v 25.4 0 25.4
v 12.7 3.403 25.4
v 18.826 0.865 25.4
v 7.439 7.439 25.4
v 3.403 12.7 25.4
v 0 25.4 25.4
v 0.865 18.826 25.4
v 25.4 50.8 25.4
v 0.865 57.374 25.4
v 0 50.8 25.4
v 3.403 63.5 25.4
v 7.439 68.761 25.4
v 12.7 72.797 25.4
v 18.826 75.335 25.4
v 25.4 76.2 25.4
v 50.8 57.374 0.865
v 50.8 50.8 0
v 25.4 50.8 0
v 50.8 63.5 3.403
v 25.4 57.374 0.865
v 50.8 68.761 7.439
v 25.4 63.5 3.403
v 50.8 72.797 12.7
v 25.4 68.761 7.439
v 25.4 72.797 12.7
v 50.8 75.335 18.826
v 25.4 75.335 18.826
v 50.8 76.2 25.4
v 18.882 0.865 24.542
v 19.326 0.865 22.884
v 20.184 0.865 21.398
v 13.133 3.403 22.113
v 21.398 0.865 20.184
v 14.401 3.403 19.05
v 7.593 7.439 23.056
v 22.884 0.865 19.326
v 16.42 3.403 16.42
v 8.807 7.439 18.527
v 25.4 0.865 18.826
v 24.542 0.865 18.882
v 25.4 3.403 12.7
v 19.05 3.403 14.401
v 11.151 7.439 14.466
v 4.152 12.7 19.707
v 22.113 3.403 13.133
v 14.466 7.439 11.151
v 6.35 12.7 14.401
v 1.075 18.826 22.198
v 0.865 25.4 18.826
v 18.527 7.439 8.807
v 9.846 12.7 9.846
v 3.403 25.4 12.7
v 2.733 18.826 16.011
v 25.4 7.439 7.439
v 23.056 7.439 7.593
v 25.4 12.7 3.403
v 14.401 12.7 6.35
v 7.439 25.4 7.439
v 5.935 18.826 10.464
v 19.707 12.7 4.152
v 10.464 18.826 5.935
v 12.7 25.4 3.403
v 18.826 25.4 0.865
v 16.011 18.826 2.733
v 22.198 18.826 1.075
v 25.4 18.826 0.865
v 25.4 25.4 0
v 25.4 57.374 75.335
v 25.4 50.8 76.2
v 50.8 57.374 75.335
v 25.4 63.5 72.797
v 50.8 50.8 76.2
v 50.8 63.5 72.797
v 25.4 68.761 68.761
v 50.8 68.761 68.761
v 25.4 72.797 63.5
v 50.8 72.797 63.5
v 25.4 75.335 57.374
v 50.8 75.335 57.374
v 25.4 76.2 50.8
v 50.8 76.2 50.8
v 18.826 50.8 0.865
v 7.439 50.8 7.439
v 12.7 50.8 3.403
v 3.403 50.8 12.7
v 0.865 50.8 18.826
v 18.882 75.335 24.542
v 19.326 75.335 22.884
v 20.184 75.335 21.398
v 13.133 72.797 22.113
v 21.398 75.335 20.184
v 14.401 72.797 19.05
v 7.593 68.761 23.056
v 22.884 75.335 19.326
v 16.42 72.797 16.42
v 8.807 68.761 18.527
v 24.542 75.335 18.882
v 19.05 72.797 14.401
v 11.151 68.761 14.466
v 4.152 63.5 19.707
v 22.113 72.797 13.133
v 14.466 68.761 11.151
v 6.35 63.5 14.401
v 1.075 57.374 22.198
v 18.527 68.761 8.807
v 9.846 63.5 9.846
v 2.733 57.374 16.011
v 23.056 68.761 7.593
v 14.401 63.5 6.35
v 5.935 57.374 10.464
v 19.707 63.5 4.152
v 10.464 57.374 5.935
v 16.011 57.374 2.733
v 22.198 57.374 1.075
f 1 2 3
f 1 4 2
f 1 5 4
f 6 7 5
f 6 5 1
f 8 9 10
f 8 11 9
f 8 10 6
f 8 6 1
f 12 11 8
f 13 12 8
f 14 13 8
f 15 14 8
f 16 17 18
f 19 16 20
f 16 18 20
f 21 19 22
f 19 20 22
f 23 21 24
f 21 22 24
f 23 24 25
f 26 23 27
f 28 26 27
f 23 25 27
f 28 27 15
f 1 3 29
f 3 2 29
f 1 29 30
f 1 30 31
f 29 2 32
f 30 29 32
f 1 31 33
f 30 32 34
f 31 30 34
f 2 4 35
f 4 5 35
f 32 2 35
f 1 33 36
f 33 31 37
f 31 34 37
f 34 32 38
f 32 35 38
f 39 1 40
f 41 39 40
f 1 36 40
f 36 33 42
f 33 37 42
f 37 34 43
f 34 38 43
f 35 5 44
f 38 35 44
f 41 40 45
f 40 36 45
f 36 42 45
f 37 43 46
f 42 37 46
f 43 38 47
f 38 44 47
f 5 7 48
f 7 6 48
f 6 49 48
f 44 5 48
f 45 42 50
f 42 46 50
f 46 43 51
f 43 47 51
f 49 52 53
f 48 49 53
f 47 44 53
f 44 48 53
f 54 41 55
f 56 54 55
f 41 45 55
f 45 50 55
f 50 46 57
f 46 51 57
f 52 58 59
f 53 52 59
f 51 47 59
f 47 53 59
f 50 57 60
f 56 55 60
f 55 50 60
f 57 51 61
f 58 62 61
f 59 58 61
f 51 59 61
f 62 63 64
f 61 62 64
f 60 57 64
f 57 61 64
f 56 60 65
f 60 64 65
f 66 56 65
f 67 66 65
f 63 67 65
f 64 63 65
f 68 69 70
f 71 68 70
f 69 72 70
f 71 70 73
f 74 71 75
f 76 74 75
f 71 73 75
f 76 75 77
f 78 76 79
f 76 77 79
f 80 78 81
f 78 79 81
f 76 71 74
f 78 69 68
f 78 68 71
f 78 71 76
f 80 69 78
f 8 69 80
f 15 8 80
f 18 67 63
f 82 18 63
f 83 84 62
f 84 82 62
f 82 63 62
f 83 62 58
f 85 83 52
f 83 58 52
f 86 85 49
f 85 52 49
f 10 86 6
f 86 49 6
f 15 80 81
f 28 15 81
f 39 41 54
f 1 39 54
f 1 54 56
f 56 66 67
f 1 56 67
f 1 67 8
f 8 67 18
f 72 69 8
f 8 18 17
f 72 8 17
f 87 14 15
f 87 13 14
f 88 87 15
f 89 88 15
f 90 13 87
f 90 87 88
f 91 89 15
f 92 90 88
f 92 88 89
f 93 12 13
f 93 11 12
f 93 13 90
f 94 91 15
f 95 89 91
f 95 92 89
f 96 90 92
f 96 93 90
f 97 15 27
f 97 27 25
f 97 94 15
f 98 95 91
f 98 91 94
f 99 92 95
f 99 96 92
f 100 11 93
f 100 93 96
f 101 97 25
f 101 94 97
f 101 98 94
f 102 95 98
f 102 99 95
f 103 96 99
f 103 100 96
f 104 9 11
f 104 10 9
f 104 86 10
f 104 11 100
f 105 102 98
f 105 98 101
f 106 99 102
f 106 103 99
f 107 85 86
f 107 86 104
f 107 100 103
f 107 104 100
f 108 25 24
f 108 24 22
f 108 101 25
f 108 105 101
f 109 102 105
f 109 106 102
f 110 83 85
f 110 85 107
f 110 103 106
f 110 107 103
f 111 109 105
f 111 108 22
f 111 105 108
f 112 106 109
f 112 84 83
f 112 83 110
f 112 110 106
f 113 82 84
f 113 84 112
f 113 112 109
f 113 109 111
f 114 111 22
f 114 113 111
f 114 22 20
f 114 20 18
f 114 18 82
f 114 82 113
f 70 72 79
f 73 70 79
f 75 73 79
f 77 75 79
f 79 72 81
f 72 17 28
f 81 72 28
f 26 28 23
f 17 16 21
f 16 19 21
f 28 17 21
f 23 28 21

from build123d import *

# Parameters (mm, degrees)
F1_DEPTH = 25.4
F2_W     = 25.4
F2_H     = 25.4
F3_DEPTH = 50.8
F4_R     = 25.39999


# Not quite as in the source:
# - a fillet or chamfer is up to 0.001 mm smaller than in the source, because OpenCascade refuses the exact size


with BuildPart() as f1:
    # F0 (on Top) → F1 (new body)
    with BuildSketch(Plane.XY):
        Polygon((0, 76.2), (0, 0), (25.4, 0), (25.4, 50.8), (50.8, 50.8), (50.8, 76.2), align=None)
    extrude(amount=F1_DEPTH)

    # F2 (on face) → F3 (join)
    with BuildSketch(Plane.XY.offset(25.4)):
        with Locations((38.1, 63.5)):
            Rectangle(F2_W, F2_H)
    extrude(amount=F3_DEPTH)

    # F4 (radius 25.4 in the source; OpenCascade refuses exactly that, so slightly less here)
    f4_edges = [f1.edges().sort_by_distance(p)[0] for p in [
        (0, 38.1, 0),
        (0, 0, 12.7),
        (0, 76.2, 12.7),
        (25.4, 76.2, 0),
        (38.1, 76.2, 76.2),
        (12.7, 0, 0),
    ]]
    fillet(f4_edges, radius=F4_R)


solid = f1.part
